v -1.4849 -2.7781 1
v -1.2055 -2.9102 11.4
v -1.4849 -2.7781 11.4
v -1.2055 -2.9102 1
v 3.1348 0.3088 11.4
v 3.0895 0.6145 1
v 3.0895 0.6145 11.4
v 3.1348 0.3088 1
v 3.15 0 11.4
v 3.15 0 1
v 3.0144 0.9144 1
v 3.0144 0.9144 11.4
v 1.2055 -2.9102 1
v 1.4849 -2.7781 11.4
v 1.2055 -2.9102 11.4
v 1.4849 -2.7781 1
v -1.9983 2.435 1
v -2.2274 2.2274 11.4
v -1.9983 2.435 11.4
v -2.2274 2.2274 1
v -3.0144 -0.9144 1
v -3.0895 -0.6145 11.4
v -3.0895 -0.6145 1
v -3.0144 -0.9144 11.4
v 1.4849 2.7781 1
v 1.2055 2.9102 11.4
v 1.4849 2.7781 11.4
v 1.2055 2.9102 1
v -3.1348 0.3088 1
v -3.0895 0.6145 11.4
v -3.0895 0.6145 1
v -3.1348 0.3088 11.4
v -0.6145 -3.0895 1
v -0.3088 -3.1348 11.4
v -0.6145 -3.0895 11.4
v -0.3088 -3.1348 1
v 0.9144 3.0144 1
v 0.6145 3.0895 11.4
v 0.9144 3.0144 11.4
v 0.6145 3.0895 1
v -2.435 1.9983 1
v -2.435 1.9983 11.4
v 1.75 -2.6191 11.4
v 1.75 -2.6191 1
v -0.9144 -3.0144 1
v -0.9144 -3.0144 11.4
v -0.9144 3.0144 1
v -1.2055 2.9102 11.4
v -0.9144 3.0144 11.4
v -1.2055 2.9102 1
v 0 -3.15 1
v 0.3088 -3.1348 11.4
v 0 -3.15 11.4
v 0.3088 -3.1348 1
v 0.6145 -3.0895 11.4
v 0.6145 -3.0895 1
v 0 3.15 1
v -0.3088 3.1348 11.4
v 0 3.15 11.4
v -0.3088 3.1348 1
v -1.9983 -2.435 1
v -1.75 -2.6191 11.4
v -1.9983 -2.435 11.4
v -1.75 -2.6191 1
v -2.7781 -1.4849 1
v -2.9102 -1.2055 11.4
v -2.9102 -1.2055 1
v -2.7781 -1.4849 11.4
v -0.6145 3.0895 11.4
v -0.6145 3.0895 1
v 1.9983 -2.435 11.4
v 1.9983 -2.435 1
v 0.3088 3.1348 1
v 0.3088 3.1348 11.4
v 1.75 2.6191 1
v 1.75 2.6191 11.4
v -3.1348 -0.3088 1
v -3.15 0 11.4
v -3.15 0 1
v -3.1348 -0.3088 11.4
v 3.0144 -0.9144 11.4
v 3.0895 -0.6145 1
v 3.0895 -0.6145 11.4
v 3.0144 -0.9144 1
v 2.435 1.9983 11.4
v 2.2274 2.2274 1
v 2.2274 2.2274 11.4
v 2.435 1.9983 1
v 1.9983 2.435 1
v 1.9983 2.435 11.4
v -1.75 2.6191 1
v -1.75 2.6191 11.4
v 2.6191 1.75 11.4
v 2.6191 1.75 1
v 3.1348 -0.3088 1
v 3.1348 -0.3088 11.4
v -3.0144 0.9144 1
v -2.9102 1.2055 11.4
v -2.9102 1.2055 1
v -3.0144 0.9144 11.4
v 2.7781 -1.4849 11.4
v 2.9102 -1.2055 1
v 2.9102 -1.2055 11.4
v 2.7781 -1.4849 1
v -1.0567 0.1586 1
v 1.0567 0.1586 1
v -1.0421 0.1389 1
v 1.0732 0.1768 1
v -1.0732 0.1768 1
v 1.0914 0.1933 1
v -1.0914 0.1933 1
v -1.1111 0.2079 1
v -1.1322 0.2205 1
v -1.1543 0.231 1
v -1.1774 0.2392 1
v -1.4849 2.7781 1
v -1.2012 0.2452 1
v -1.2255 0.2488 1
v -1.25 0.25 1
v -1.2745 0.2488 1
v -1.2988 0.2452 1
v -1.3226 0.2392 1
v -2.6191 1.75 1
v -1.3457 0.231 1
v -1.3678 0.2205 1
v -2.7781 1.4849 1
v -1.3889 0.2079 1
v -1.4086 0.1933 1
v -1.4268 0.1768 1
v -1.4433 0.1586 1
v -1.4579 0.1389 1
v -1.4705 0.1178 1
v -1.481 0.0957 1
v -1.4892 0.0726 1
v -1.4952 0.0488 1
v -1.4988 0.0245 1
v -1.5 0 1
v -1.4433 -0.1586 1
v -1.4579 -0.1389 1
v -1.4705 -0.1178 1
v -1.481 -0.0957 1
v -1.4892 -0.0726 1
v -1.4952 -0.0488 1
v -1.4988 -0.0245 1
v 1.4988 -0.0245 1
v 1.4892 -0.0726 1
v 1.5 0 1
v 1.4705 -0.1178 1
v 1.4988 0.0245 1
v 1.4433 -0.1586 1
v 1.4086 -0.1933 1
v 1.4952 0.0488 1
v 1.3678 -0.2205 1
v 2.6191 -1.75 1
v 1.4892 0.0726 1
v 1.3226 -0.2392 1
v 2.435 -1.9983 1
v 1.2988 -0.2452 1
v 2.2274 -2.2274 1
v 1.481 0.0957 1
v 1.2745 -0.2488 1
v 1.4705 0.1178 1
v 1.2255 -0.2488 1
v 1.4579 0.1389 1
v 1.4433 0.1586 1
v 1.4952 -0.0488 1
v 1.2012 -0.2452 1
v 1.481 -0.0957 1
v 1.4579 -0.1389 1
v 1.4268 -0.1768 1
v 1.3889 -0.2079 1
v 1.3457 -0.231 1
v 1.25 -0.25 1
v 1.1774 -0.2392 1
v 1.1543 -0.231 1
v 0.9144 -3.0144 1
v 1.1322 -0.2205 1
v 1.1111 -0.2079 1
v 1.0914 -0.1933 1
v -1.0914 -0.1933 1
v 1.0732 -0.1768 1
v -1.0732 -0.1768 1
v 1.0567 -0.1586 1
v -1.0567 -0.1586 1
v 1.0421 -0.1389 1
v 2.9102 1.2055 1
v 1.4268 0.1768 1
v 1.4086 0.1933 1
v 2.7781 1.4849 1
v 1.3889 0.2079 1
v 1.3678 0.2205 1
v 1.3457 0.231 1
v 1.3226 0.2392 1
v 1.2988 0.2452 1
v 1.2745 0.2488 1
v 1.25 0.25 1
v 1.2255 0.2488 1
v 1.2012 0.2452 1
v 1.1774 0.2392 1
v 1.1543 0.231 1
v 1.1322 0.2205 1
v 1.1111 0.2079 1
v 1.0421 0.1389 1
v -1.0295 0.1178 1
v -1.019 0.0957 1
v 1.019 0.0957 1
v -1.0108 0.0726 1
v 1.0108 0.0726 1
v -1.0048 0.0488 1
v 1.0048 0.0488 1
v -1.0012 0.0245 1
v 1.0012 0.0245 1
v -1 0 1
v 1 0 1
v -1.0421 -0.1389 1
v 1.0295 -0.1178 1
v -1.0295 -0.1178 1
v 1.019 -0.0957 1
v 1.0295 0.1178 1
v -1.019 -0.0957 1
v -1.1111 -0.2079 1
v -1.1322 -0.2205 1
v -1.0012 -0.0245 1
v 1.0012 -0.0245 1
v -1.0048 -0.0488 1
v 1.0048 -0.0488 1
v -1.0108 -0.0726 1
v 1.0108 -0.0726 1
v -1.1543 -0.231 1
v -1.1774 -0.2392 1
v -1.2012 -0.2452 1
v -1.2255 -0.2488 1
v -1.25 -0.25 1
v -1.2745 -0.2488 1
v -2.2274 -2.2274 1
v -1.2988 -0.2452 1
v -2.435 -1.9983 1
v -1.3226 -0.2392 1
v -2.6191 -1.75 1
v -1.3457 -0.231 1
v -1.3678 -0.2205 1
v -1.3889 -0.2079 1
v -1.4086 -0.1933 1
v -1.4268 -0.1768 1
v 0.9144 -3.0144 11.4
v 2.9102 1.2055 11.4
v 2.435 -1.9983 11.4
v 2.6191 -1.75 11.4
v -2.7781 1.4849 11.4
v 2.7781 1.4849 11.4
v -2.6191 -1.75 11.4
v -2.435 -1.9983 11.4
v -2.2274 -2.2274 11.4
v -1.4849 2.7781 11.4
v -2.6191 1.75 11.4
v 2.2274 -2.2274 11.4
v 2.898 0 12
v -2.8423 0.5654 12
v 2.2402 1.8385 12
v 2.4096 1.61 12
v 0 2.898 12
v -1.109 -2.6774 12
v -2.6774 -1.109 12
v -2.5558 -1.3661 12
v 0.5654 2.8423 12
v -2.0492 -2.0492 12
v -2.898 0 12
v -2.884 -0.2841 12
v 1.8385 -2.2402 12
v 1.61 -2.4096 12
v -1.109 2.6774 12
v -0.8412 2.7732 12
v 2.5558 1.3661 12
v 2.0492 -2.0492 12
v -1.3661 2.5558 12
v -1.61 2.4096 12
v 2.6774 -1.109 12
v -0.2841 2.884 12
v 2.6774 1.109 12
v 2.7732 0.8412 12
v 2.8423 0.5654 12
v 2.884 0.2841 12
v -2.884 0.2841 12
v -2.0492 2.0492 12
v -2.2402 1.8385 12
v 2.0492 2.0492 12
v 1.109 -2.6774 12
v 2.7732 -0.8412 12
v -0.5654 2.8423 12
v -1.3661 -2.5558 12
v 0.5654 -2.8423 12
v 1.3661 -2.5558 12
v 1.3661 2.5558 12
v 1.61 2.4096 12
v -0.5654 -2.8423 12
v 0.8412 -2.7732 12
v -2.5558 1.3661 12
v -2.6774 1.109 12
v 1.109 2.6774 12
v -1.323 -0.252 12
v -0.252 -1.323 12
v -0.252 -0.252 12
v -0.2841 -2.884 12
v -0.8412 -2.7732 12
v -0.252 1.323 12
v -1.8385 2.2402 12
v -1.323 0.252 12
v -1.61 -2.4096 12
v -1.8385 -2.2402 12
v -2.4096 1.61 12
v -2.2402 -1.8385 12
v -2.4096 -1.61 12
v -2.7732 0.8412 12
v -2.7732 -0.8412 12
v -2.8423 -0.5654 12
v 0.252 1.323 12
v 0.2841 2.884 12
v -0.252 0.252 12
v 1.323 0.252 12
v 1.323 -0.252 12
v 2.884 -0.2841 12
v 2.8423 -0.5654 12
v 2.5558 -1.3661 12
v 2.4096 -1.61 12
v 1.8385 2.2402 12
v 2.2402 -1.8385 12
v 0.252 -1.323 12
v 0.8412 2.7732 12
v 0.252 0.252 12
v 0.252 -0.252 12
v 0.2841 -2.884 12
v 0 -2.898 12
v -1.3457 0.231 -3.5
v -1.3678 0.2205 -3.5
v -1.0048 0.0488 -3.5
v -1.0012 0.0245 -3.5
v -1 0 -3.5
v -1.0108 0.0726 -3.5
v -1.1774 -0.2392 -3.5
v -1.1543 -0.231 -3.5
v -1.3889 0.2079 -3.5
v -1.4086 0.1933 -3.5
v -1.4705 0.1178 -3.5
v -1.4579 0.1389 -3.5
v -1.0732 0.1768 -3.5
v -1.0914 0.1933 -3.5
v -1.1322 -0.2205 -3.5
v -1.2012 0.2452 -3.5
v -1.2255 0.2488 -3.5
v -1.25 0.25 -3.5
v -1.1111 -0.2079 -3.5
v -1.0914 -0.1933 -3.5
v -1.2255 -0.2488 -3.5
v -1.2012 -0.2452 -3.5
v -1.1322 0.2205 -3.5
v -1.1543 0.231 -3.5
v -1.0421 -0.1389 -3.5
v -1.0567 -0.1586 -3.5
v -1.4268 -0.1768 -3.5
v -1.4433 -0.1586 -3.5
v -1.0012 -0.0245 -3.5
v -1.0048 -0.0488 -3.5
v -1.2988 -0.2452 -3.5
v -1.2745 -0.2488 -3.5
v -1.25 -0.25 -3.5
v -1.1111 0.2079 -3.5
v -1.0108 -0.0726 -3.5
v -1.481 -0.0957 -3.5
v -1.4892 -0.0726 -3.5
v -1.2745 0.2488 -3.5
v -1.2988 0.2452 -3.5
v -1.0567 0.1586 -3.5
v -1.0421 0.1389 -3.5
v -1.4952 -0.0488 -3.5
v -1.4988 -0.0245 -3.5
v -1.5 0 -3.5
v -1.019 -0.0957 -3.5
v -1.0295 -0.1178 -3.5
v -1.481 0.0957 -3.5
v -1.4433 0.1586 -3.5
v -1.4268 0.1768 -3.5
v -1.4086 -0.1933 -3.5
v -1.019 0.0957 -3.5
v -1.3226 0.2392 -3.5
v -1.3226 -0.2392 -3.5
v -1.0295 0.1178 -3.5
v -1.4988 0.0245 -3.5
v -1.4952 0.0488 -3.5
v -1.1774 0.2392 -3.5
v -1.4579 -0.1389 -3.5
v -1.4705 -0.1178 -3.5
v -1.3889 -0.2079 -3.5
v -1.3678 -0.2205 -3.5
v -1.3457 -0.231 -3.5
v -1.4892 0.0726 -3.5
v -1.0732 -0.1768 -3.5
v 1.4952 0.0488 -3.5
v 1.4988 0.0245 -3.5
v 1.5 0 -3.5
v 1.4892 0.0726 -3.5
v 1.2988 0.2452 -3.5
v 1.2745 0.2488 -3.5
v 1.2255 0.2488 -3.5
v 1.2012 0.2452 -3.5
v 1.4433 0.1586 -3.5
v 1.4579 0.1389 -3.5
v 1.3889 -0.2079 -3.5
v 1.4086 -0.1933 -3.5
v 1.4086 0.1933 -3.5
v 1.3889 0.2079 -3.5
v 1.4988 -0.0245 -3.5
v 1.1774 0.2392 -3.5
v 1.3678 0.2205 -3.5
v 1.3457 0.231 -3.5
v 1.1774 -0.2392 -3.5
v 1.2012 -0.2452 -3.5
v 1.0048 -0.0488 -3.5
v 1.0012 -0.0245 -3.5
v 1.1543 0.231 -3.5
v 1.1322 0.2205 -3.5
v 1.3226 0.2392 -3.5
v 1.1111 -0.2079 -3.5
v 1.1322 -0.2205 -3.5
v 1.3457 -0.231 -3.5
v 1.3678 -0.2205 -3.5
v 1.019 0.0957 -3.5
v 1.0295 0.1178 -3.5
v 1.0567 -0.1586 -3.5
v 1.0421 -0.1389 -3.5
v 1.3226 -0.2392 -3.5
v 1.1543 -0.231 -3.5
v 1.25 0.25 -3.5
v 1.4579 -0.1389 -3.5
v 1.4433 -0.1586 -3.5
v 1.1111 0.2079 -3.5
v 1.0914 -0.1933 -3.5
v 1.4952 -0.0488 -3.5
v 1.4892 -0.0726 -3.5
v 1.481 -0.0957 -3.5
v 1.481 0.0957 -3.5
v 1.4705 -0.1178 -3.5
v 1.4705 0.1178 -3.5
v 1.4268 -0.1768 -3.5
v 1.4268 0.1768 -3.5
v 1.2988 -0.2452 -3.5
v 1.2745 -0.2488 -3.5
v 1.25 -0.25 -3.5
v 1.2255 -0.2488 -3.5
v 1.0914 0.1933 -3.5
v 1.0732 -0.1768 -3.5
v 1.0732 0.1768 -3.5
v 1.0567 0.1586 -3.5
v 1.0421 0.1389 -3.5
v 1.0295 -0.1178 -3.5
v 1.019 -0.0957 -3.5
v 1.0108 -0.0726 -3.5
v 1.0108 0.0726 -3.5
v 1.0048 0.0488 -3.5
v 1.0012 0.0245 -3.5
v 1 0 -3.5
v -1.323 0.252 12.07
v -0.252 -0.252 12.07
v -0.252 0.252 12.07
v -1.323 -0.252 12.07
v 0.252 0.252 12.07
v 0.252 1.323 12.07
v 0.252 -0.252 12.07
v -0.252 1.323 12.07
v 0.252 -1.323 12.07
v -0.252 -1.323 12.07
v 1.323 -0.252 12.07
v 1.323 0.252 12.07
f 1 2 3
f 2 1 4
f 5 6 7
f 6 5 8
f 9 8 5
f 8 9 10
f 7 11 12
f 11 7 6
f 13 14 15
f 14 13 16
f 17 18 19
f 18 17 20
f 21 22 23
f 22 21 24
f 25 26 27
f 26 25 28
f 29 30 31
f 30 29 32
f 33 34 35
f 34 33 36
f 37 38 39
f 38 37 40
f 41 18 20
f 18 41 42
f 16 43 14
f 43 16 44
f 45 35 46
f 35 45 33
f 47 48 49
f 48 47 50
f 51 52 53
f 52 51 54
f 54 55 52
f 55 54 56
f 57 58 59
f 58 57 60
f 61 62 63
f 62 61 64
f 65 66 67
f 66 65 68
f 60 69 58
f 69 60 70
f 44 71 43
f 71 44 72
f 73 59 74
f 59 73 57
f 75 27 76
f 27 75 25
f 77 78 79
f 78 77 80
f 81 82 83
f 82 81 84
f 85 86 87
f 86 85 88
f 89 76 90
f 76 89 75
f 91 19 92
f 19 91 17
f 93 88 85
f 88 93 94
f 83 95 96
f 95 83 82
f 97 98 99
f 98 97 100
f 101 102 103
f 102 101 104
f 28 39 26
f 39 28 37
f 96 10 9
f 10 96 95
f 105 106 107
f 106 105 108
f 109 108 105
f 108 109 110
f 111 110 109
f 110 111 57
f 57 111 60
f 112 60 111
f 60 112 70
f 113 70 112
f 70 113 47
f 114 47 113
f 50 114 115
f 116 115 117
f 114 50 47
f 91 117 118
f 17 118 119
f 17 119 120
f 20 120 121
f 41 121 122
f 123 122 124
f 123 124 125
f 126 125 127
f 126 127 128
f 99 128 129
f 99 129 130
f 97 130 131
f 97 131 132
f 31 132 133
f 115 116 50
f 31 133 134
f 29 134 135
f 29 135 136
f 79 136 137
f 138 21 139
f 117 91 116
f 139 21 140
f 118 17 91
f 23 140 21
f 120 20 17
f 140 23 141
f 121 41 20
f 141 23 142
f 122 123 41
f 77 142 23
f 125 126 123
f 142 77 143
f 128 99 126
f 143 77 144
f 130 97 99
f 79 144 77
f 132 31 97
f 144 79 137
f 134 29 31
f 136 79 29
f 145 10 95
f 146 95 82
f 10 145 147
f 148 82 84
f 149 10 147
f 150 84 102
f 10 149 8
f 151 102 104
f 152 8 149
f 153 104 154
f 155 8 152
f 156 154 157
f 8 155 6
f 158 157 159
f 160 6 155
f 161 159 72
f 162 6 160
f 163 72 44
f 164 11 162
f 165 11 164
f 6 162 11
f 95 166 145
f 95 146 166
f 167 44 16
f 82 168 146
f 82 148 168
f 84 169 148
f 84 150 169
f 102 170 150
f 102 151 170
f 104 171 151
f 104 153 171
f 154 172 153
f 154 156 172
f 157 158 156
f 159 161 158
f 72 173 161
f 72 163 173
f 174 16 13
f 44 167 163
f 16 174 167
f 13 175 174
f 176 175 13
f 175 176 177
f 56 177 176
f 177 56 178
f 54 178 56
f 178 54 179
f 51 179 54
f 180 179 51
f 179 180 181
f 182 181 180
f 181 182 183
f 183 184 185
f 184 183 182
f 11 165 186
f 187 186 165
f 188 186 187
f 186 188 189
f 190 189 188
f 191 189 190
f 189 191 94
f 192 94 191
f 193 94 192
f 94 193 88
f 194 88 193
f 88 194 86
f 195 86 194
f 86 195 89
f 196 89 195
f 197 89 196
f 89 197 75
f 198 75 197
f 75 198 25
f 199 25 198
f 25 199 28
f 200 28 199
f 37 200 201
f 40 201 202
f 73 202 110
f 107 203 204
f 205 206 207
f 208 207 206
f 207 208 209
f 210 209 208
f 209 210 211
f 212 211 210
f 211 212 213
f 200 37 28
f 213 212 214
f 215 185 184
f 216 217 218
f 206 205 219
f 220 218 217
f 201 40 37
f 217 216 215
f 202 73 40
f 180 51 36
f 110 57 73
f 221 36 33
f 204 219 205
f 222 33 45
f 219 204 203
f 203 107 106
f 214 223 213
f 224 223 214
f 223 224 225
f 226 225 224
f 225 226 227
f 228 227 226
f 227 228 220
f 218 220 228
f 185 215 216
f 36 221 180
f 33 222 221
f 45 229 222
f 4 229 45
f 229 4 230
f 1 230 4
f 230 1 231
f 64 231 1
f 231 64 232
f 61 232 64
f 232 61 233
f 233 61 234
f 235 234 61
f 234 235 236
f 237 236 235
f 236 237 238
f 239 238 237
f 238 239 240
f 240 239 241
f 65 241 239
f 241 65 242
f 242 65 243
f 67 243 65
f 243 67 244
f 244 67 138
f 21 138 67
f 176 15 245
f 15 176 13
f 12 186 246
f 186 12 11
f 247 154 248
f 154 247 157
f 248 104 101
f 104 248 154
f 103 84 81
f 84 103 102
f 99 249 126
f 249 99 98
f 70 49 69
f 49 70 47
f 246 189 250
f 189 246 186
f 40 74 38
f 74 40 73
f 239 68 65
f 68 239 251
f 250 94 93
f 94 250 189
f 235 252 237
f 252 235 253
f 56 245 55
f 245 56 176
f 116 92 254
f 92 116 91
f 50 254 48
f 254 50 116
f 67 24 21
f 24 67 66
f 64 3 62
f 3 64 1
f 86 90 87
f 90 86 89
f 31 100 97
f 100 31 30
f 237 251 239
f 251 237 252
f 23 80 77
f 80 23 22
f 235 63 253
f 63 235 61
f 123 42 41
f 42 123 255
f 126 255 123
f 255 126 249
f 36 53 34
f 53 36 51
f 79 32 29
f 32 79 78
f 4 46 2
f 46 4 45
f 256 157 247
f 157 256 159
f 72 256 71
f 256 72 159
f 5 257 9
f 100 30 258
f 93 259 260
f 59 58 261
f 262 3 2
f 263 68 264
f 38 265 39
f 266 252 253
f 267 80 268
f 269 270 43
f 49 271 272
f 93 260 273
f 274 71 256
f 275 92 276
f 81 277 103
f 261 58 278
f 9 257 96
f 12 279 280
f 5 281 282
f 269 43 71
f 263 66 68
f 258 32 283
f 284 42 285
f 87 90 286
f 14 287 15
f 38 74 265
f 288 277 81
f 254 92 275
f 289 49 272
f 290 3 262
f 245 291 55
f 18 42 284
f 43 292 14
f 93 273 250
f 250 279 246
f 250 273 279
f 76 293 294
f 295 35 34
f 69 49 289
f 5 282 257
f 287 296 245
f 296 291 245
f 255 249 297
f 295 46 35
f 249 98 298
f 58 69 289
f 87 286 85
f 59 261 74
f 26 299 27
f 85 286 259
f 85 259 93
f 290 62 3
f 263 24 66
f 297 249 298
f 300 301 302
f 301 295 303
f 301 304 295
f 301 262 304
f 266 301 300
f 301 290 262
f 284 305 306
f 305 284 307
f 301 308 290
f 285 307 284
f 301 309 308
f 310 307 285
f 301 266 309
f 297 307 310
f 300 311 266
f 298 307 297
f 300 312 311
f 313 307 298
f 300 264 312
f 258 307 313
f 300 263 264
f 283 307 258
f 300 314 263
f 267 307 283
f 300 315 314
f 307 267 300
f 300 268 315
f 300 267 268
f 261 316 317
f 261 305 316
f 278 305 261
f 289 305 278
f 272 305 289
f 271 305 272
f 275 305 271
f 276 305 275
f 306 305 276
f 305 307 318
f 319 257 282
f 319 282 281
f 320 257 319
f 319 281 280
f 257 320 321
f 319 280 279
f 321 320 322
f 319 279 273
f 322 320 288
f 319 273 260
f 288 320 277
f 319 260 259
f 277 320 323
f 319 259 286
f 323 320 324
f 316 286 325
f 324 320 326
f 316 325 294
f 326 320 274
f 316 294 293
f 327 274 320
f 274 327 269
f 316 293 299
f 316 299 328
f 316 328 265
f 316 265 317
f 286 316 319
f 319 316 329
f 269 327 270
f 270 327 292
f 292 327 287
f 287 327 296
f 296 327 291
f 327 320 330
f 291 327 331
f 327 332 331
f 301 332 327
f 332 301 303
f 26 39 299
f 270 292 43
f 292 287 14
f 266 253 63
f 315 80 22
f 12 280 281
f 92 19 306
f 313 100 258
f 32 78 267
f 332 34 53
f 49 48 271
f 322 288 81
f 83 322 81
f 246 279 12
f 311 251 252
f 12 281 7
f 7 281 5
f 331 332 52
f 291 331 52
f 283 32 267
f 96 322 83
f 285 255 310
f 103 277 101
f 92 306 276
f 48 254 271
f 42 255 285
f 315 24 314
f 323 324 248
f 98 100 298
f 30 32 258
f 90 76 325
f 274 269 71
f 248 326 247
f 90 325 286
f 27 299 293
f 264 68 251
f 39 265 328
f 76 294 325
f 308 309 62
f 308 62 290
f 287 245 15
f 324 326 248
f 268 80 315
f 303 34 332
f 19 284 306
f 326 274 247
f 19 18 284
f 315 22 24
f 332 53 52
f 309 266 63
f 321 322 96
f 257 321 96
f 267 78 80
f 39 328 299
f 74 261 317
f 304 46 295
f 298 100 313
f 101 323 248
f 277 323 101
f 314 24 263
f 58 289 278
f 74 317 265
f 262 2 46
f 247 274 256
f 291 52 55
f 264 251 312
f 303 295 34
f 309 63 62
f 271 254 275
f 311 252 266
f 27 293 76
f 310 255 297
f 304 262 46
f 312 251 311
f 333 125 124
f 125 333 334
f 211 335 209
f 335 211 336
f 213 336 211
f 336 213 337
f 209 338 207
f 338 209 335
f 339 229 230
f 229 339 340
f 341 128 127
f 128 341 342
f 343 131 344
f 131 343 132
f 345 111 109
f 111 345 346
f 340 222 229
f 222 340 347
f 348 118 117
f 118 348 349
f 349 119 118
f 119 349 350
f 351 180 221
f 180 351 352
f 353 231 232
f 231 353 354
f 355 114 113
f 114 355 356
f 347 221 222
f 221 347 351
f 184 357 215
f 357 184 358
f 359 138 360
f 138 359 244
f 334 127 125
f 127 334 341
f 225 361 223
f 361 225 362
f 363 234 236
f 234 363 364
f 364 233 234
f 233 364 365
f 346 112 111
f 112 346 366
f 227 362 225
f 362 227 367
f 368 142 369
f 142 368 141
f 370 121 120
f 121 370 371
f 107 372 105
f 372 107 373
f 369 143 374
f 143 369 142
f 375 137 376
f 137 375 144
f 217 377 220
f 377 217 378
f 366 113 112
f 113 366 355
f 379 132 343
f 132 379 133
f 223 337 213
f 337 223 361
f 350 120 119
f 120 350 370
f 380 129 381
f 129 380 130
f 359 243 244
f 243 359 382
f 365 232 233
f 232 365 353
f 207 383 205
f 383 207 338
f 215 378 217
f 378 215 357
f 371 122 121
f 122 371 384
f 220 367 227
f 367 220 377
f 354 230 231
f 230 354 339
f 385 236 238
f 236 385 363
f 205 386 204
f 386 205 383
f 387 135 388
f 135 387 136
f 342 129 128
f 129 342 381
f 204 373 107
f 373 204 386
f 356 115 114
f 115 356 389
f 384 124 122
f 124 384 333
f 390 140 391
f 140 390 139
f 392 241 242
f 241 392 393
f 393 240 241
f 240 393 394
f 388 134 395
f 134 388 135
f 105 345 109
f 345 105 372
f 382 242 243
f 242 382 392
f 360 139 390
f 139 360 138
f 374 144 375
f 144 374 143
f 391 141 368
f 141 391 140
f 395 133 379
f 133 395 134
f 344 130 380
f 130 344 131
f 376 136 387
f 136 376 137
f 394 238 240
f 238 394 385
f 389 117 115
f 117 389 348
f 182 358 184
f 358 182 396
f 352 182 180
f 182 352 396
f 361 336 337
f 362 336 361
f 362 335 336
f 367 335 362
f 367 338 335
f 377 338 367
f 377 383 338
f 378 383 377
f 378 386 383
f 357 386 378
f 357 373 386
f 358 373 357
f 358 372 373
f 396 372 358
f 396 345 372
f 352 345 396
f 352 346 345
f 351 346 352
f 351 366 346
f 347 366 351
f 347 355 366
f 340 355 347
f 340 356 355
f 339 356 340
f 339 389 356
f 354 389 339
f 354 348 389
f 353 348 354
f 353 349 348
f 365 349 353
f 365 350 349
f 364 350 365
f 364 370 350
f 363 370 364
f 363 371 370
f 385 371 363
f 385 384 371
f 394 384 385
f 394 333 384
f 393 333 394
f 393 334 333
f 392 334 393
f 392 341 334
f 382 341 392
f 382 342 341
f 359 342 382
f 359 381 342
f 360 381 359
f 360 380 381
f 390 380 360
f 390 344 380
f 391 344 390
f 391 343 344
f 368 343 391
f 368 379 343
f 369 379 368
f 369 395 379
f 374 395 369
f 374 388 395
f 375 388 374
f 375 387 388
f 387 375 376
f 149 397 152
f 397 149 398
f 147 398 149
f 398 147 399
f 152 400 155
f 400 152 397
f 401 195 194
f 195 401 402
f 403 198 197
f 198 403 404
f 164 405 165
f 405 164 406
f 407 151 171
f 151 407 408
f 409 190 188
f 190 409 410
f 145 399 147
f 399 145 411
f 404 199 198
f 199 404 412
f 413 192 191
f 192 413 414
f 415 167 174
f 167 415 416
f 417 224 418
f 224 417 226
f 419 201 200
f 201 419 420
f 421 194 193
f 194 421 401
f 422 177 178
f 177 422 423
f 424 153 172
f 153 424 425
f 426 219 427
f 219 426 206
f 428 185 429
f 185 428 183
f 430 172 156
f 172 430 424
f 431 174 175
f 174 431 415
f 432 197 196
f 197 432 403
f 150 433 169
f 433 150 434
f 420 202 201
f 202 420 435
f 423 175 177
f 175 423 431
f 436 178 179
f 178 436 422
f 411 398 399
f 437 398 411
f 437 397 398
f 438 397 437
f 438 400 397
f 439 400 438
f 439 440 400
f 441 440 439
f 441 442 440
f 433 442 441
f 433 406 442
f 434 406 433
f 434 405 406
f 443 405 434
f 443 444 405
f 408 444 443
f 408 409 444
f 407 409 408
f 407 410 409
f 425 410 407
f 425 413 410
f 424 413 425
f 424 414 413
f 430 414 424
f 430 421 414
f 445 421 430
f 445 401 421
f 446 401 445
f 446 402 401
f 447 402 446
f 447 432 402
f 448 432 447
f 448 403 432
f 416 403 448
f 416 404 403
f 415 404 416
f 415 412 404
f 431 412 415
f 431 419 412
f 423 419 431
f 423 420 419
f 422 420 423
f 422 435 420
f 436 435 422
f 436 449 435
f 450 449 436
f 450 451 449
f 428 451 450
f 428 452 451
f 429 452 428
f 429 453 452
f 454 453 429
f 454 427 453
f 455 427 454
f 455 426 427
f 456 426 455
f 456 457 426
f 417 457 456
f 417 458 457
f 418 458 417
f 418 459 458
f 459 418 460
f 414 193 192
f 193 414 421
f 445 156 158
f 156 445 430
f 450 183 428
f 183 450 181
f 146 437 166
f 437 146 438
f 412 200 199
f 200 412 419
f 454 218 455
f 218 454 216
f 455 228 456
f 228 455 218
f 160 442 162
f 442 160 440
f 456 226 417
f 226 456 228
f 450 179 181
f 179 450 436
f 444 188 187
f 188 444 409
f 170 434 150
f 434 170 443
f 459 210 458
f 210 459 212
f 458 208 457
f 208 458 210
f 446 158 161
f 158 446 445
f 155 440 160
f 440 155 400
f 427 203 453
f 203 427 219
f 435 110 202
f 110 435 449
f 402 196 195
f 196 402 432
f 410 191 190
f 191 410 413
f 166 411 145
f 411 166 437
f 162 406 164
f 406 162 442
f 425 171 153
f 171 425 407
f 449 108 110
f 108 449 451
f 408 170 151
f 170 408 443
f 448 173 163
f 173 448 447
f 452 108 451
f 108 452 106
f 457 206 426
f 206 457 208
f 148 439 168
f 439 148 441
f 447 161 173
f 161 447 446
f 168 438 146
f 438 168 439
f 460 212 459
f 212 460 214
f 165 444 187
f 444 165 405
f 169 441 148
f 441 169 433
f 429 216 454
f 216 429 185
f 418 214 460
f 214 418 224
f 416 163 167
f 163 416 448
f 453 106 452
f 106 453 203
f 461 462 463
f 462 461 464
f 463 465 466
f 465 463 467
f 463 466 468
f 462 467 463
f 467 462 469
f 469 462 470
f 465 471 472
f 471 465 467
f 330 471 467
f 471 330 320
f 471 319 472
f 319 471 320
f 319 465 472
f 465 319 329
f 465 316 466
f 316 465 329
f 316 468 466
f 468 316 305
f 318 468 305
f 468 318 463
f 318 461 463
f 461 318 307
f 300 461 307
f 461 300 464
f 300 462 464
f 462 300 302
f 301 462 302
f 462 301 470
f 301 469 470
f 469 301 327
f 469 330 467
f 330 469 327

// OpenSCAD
$fn = 64;

body_diameter = 6.3;
body_height = 11;
lead_spacing = 2.5;
lead_diameter = 0.5;
lead_length_below = 3.5;
body_lift = 1;
lead_stub = 1;
top_chamfer = 0.6;

module lead(x) {
    color([0.75, 0.75, 0.75])
    translate([x, 0, -lead_length_below])
        cylinder(h = lead_length_below + body_lift + lead_stub, d = lead_diameter);
}

module capacitor_body() {
    color([0.16, 0.18, 0.19])
    union() {
        translate([0, 0, body_lift])
            cylinder(h = body_height - top_chamfer, d = body_diameter);
        translate([0, 0, body_lift + body_height - top_chamfer])
            cylinder(h = top_chamfer, d1 = body_diameter, d2 = body_diameter * 0.92);
    }
}

module top_vent() {
    color([0.78, 0.78, 0.78])
    translate([0, 0, body_lift + body_height - 0.05])
    linear_extrude(height = 0.12)
    union() {
        square([body_diameter * 0.42, body_diameter * 0.08], center = true);
        square([body_diameter * 0.08, body_diameter * 0.42], center = true);
    }
}

lead(-lead_spacing / 2);
lead( lead_spacing / 2);
capacitor_body();
top_vent();
